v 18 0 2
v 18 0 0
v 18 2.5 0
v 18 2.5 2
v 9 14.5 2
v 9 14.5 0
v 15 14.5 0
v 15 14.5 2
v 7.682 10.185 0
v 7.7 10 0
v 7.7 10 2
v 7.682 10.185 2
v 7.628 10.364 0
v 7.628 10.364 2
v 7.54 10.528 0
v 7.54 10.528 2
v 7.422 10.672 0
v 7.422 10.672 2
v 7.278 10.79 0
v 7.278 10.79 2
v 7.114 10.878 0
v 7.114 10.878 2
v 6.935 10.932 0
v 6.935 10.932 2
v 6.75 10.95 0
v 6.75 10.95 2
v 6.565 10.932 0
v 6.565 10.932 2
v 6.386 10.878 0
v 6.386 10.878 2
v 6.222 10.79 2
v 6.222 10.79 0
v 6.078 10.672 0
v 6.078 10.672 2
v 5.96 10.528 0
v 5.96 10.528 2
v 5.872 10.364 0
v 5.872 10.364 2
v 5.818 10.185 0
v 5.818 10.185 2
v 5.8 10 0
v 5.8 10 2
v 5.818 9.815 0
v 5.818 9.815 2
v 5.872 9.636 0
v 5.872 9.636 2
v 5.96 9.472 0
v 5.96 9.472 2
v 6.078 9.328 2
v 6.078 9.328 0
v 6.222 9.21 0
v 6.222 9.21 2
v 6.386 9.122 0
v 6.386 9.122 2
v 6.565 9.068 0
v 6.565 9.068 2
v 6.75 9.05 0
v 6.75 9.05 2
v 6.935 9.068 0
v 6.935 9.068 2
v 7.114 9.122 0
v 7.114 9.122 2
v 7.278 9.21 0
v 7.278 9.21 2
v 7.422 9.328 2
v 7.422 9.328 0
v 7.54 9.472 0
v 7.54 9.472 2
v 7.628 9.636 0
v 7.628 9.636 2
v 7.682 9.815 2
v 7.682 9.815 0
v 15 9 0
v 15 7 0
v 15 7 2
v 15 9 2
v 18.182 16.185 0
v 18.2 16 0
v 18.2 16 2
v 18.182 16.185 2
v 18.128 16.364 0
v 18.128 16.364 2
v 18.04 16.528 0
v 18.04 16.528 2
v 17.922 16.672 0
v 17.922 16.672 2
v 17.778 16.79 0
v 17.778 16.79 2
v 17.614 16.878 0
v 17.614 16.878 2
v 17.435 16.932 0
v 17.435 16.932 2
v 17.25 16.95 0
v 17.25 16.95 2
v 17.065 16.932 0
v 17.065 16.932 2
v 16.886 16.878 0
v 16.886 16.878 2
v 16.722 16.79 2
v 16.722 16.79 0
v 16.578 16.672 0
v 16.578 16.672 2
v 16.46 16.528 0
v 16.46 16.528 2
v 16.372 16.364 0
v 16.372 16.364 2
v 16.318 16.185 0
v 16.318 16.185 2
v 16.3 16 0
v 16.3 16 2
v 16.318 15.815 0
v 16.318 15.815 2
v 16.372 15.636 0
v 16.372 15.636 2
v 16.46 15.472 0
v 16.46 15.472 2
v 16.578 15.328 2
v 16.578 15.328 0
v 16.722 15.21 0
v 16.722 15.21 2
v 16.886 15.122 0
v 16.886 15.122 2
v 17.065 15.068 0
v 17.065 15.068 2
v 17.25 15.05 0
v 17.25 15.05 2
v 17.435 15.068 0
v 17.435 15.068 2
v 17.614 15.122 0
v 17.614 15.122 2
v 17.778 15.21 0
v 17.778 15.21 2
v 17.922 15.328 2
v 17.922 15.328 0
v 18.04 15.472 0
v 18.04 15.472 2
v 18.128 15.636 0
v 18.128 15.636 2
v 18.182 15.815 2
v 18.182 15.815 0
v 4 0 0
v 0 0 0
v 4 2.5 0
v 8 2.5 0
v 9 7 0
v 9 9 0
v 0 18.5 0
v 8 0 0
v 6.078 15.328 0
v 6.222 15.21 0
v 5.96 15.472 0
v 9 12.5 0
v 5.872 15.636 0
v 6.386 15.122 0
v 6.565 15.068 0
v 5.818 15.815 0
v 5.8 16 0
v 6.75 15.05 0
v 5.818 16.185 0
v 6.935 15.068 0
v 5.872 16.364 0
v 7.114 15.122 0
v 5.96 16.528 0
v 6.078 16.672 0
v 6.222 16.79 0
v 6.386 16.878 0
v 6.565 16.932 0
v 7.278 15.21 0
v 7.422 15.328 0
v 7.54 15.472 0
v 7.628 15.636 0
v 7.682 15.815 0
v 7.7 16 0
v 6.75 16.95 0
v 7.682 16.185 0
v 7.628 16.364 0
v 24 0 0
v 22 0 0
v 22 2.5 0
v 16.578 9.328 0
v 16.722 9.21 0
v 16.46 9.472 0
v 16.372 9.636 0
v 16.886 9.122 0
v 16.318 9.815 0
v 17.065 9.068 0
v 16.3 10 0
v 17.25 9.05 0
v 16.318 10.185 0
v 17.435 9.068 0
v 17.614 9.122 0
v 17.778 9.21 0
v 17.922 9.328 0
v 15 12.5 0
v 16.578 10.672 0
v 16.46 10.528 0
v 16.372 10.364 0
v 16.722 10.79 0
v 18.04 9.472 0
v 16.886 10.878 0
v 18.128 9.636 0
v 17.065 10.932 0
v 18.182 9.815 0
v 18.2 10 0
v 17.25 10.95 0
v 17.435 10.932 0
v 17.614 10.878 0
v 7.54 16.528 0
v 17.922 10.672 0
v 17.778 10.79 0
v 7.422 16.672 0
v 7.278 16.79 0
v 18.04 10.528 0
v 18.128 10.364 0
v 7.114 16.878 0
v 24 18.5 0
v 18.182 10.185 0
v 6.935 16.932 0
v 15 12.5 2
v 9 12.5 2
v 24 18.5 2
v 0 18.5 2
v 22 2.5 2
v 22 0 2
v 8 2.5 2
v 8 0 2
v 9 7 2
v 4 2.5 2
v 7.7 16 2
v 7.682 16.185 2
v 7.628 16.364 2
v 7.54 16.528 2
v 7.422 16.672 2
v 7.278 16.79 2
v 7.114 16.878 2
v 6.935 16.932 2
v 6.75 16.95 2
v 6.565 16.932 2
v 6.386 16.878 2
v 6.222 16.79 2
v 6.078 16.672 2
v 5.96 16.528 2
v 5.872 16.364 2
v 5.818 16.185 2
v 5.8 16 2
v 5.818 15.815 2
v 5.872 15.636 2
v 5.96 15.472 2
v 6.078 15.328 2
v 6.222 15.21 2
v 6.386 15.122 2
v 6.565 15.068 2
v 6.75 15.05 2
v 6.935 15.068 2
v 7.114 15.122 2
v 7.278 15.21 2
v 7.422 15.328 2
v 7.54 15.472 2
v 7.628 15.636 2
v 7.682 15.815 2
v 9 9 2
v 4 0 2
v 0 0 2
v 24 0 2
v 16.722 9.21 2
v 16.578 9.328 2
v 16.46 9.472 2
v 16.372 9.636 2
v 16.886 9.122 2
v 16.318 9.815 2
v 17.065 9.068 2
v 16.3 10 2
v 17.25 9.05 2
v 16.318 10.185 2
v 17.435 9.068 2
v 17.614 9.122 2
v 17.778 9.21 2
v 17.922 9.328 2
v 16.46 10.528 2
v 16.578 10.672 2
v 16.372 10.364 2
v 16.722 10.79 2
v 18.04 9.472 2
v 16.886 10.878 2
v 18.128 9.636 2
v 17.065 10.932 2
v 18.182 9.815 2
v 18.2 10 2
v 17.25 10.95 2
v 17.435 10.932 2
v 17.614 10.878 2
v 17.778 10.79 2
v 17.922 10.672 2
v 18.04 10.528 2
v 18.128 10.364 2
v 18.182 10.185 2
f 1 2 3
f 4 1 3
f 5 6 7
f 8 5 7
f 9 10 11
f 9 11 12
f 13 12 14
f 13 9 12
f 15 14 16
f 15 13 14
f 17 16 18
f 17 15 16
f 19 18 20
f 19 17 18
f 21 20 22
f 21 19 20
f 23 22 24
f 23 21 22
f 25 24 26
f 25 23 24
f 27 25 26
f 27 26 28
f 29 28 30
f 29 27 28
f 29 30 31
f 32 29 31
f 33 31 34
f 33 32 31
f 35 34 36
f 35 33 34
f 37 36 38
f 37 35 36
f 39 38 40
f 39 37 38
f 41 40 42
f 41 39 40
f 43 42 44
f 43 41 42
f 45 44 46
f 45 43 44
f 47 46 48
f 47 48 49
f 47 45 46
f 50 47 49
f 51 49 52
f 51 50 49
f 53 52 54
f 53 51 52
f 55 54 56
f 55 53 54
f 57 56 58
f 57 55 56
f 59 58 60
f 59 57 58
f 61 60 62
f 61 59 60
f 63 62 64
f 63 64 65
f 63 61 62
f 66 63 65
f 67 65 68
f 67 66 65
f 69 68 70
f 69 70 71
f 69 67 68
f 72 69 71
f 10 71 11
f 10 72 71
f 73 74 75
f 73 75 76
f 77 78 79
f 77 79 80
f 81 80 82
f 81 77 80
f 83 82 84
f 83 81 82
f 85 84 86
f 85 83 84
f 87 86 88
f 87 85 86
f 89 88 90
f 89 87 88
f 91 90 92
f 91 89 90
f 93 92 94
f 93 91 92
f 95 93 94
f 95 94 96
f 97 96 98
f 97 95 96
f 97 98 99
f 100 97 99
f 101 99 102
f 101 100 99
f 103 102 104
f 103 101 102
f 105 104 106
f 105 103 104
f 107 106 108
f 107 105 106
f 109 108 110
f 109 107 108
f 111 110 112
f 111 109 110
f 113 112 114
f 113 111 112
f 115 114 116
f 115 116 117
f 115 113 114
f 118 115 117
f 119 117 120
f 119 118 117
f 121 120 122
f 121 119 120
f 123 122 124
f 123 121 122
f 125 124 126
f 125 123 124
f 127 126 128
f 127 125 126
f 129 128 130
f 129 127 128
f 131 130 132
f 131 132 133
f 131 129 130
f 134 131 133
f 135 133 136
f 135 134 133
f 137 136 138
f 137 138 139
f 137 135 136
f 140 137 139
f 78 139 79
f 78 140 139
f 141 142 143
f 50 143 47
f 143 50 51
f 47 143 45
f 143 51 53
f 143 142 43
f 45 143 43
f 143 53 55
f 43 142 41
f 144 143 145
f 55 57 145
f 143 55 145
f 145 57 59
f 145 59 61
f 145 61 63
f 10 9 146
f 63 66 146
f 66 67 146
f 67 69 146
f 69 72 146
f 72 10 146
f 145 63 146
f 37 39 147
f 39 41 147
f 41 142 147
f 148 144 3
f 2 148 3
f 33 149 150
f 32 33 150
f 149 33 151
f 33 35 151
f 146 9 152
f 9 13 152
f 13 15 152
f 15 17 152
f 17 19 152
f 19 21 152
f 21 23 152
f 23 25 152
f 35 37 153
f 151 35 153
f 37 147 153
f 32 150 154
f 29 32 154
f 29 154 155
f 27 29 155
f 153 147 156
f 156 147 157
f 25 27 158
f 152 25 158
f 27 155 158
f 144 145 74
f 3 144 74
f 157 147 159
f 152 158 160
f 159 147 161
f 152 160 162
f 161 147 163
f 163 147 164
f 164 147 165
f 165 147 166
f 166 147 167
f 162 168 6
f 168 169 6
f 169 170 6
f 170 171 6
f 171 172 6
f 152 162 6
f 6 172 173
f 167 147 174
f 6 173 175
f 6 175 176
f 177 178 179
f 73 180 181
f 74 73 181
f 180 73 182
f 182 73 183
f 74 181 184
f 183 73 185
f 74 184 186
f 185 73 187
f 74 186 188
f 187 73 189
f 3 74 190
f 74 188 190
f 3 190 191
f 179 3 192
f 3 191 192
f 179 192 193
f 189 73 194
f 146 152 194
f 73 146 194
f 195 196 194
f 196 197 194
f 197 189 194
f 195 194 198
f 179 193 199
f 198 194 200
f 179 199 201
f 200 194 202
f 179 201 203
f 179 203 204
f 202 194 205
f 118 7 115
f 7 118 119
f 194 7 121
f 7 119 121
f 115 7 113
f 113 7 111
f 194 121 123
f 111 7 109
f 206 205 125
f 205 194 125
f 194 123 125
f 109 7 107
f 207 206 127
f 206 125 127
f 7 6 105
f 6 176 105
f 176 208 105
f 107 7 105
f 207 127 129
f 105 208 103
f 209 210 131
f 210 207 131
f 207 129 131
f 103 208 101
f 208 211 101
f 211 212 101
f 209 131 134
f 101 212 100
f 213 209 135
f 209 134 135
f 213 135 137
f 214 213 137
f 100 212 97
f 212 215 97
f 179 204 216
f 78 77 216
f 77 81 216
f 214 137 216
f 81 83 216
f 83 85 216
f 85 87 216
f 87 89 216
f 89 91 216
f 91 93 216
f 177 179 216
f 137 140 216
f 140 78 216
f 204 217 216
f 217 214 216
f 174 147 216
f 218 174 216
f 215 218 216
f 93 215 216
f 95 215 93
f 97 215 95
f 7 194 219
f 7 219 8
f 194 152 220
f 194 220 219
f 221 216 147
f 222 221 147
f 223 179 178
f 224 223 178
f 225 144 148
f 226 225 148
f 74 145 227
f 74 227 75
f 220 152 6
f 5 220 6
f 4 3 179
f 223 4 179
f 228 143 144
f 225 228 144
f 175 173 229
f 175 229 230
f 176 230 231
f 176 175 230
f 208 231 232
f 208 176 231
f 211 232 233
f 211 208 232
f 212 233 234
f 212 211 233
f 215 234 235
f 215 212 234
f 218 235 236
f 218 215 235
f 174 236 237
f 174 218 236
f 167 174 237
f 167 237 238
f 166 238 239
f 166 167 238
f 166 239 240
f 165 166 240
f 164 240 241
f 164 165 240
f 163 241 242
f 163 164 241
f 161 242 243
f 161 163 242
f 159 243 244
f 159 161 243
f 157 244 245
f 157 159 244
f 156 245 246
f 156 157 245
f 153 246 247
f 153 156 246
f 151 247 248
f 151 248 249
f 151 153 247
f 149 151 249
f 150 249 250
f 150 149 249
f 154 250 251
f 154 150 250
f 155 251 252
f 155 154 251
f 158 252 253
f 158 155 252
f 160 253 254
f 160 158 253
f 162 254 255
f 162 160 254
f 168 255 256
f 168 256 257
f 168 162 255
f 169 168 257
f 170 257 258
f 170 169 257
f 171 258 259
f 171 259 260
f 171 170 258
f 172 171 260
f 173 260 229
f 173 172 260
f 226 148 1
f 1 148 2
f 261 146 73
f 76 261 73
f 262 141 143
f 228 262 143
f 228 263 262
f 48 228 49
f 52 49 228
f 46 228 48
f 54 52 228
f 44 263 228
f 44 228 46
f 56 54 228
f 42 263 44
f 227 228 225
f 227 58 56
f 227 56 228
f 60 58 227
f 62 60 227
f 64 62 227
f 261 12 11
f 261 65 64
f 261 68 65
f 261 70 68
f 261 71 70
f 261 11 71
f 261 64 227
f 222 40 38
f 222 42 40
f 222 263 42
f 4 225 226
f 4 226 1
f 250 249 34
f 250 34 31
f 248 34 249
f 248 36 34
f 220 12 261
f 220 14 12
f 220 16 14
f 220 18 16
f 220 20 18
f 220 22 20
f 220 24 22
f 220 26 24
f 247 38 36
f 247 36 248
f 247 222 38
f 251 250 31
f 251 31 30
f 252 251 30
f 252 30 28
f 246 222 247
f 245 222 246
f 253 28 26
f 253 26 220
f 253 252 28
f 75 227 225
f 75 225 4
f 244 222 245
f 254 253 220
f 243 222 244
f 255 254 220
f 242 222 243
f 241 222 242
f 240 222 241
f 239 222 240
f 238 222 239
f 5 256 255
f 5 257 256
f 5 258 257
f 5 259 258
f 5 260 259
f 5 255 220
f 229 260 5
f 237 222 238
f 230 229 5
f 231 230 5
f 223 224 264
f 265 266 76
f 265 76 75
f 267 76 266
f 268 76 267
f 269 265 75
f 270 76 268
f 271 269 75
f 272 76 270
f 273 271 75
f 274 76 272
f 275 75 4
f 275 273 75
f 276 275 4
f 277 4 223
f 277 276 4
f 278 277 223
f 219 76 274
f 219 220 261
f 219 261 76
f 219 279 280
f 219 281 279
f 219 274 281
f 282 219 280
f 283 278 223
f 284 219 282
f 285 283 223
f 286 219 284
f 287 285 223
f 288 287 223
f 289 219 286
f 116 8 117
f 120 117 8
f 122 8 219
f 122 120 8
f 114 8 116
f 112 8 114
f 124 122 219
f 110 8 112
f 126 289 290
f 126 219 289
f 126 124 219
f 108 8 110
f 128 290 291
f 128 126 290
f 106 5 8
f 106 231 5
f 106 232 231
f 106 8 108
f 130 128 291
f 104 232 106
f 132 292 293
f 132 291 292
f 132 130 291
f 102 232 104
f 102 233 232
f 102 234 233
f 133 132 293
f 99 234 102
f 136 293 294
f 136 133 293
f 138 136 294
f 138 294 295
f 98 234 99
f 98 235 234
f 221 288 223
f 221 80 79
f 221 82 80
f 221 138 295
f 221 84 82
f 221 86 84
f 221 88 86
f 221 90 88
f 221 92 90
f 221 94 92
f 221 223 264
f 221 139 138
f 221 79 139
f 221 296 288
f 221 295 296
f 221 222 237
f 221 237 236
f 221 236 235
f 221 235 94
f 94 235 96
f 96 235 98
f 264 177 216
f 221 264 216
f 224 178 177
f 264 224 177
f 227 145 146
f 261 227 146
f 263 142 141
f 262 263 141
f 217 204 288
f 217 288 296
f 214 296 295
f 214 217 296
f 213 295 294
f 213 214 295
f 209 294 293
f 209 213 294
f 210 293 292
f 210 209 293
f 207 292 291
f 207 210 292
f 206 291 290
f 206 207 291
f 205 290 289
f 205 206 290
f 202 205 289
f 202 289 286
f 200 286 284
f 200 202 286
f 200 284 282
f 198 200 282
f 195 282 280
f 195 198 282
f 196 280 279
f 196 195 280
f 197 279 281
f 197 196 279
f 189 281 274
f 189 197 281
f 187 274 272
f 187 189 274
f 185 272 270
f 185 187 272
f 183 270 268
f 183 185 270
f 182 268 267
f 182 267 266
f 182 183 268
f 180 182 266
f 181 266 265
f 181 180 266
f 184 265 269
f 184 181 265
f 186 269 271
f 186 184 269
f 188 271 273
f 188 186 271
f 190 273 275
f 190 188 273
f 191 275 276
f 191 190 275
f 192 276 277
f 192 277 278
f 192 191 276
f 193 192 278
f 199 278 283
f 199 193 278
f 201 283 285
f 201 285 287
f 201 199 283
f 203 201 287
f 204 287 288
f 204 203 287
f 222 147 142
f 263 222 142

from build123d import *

# Parameters (mm, degrees)
SKETCH1_R           = 0.95
SKETCH1_W           = 6
SKETCH1_H           = 2
BOSS_EXTRUDE1_DEPTH = 2


with BuildPart() as part:
    # Sketch1 → Boss-Extrude1 (new body)
    with BuildSketch(Plane.XY):
        Polygon((4, 2.5), (8, 2.5), (8, 0), (18, 0), (18, 2.5), (22, 2.5), (22, 0), (24, 0), (24, 18.5), (0, 18.5), (0, 0), (4, 0), align=None)
        with Locations((6.75, 16)):
            Circle(SKETCH1_R, mode=Mode.SUBTRACT)
        with Locations((17.25, 10)):
            Circle(SKETCH1_R, mode=Mode.SUBTRACT)
        with Locations((17.25, 16)):
            Circle(SKETCH1_R, mode=Mode.SUBTRACT)
        with Locations((6.75, 10)):
            Circle(SKETCH1_R, mode=Mode.SUBTRACT)
        with Locations((12, 13.5)):
            Rectangle(SKETCH1_W, SKETCH1_H, mode=Mode.SUBTRACT)
        with Locations((12, 8)):
            Rectangle(SKETCH1_W, SKETCH1_H, mode=Mode.SUBTRACT)
    extrude(amount=BOSS_EXTRUDE1_DEPTH)


solid = part.part
